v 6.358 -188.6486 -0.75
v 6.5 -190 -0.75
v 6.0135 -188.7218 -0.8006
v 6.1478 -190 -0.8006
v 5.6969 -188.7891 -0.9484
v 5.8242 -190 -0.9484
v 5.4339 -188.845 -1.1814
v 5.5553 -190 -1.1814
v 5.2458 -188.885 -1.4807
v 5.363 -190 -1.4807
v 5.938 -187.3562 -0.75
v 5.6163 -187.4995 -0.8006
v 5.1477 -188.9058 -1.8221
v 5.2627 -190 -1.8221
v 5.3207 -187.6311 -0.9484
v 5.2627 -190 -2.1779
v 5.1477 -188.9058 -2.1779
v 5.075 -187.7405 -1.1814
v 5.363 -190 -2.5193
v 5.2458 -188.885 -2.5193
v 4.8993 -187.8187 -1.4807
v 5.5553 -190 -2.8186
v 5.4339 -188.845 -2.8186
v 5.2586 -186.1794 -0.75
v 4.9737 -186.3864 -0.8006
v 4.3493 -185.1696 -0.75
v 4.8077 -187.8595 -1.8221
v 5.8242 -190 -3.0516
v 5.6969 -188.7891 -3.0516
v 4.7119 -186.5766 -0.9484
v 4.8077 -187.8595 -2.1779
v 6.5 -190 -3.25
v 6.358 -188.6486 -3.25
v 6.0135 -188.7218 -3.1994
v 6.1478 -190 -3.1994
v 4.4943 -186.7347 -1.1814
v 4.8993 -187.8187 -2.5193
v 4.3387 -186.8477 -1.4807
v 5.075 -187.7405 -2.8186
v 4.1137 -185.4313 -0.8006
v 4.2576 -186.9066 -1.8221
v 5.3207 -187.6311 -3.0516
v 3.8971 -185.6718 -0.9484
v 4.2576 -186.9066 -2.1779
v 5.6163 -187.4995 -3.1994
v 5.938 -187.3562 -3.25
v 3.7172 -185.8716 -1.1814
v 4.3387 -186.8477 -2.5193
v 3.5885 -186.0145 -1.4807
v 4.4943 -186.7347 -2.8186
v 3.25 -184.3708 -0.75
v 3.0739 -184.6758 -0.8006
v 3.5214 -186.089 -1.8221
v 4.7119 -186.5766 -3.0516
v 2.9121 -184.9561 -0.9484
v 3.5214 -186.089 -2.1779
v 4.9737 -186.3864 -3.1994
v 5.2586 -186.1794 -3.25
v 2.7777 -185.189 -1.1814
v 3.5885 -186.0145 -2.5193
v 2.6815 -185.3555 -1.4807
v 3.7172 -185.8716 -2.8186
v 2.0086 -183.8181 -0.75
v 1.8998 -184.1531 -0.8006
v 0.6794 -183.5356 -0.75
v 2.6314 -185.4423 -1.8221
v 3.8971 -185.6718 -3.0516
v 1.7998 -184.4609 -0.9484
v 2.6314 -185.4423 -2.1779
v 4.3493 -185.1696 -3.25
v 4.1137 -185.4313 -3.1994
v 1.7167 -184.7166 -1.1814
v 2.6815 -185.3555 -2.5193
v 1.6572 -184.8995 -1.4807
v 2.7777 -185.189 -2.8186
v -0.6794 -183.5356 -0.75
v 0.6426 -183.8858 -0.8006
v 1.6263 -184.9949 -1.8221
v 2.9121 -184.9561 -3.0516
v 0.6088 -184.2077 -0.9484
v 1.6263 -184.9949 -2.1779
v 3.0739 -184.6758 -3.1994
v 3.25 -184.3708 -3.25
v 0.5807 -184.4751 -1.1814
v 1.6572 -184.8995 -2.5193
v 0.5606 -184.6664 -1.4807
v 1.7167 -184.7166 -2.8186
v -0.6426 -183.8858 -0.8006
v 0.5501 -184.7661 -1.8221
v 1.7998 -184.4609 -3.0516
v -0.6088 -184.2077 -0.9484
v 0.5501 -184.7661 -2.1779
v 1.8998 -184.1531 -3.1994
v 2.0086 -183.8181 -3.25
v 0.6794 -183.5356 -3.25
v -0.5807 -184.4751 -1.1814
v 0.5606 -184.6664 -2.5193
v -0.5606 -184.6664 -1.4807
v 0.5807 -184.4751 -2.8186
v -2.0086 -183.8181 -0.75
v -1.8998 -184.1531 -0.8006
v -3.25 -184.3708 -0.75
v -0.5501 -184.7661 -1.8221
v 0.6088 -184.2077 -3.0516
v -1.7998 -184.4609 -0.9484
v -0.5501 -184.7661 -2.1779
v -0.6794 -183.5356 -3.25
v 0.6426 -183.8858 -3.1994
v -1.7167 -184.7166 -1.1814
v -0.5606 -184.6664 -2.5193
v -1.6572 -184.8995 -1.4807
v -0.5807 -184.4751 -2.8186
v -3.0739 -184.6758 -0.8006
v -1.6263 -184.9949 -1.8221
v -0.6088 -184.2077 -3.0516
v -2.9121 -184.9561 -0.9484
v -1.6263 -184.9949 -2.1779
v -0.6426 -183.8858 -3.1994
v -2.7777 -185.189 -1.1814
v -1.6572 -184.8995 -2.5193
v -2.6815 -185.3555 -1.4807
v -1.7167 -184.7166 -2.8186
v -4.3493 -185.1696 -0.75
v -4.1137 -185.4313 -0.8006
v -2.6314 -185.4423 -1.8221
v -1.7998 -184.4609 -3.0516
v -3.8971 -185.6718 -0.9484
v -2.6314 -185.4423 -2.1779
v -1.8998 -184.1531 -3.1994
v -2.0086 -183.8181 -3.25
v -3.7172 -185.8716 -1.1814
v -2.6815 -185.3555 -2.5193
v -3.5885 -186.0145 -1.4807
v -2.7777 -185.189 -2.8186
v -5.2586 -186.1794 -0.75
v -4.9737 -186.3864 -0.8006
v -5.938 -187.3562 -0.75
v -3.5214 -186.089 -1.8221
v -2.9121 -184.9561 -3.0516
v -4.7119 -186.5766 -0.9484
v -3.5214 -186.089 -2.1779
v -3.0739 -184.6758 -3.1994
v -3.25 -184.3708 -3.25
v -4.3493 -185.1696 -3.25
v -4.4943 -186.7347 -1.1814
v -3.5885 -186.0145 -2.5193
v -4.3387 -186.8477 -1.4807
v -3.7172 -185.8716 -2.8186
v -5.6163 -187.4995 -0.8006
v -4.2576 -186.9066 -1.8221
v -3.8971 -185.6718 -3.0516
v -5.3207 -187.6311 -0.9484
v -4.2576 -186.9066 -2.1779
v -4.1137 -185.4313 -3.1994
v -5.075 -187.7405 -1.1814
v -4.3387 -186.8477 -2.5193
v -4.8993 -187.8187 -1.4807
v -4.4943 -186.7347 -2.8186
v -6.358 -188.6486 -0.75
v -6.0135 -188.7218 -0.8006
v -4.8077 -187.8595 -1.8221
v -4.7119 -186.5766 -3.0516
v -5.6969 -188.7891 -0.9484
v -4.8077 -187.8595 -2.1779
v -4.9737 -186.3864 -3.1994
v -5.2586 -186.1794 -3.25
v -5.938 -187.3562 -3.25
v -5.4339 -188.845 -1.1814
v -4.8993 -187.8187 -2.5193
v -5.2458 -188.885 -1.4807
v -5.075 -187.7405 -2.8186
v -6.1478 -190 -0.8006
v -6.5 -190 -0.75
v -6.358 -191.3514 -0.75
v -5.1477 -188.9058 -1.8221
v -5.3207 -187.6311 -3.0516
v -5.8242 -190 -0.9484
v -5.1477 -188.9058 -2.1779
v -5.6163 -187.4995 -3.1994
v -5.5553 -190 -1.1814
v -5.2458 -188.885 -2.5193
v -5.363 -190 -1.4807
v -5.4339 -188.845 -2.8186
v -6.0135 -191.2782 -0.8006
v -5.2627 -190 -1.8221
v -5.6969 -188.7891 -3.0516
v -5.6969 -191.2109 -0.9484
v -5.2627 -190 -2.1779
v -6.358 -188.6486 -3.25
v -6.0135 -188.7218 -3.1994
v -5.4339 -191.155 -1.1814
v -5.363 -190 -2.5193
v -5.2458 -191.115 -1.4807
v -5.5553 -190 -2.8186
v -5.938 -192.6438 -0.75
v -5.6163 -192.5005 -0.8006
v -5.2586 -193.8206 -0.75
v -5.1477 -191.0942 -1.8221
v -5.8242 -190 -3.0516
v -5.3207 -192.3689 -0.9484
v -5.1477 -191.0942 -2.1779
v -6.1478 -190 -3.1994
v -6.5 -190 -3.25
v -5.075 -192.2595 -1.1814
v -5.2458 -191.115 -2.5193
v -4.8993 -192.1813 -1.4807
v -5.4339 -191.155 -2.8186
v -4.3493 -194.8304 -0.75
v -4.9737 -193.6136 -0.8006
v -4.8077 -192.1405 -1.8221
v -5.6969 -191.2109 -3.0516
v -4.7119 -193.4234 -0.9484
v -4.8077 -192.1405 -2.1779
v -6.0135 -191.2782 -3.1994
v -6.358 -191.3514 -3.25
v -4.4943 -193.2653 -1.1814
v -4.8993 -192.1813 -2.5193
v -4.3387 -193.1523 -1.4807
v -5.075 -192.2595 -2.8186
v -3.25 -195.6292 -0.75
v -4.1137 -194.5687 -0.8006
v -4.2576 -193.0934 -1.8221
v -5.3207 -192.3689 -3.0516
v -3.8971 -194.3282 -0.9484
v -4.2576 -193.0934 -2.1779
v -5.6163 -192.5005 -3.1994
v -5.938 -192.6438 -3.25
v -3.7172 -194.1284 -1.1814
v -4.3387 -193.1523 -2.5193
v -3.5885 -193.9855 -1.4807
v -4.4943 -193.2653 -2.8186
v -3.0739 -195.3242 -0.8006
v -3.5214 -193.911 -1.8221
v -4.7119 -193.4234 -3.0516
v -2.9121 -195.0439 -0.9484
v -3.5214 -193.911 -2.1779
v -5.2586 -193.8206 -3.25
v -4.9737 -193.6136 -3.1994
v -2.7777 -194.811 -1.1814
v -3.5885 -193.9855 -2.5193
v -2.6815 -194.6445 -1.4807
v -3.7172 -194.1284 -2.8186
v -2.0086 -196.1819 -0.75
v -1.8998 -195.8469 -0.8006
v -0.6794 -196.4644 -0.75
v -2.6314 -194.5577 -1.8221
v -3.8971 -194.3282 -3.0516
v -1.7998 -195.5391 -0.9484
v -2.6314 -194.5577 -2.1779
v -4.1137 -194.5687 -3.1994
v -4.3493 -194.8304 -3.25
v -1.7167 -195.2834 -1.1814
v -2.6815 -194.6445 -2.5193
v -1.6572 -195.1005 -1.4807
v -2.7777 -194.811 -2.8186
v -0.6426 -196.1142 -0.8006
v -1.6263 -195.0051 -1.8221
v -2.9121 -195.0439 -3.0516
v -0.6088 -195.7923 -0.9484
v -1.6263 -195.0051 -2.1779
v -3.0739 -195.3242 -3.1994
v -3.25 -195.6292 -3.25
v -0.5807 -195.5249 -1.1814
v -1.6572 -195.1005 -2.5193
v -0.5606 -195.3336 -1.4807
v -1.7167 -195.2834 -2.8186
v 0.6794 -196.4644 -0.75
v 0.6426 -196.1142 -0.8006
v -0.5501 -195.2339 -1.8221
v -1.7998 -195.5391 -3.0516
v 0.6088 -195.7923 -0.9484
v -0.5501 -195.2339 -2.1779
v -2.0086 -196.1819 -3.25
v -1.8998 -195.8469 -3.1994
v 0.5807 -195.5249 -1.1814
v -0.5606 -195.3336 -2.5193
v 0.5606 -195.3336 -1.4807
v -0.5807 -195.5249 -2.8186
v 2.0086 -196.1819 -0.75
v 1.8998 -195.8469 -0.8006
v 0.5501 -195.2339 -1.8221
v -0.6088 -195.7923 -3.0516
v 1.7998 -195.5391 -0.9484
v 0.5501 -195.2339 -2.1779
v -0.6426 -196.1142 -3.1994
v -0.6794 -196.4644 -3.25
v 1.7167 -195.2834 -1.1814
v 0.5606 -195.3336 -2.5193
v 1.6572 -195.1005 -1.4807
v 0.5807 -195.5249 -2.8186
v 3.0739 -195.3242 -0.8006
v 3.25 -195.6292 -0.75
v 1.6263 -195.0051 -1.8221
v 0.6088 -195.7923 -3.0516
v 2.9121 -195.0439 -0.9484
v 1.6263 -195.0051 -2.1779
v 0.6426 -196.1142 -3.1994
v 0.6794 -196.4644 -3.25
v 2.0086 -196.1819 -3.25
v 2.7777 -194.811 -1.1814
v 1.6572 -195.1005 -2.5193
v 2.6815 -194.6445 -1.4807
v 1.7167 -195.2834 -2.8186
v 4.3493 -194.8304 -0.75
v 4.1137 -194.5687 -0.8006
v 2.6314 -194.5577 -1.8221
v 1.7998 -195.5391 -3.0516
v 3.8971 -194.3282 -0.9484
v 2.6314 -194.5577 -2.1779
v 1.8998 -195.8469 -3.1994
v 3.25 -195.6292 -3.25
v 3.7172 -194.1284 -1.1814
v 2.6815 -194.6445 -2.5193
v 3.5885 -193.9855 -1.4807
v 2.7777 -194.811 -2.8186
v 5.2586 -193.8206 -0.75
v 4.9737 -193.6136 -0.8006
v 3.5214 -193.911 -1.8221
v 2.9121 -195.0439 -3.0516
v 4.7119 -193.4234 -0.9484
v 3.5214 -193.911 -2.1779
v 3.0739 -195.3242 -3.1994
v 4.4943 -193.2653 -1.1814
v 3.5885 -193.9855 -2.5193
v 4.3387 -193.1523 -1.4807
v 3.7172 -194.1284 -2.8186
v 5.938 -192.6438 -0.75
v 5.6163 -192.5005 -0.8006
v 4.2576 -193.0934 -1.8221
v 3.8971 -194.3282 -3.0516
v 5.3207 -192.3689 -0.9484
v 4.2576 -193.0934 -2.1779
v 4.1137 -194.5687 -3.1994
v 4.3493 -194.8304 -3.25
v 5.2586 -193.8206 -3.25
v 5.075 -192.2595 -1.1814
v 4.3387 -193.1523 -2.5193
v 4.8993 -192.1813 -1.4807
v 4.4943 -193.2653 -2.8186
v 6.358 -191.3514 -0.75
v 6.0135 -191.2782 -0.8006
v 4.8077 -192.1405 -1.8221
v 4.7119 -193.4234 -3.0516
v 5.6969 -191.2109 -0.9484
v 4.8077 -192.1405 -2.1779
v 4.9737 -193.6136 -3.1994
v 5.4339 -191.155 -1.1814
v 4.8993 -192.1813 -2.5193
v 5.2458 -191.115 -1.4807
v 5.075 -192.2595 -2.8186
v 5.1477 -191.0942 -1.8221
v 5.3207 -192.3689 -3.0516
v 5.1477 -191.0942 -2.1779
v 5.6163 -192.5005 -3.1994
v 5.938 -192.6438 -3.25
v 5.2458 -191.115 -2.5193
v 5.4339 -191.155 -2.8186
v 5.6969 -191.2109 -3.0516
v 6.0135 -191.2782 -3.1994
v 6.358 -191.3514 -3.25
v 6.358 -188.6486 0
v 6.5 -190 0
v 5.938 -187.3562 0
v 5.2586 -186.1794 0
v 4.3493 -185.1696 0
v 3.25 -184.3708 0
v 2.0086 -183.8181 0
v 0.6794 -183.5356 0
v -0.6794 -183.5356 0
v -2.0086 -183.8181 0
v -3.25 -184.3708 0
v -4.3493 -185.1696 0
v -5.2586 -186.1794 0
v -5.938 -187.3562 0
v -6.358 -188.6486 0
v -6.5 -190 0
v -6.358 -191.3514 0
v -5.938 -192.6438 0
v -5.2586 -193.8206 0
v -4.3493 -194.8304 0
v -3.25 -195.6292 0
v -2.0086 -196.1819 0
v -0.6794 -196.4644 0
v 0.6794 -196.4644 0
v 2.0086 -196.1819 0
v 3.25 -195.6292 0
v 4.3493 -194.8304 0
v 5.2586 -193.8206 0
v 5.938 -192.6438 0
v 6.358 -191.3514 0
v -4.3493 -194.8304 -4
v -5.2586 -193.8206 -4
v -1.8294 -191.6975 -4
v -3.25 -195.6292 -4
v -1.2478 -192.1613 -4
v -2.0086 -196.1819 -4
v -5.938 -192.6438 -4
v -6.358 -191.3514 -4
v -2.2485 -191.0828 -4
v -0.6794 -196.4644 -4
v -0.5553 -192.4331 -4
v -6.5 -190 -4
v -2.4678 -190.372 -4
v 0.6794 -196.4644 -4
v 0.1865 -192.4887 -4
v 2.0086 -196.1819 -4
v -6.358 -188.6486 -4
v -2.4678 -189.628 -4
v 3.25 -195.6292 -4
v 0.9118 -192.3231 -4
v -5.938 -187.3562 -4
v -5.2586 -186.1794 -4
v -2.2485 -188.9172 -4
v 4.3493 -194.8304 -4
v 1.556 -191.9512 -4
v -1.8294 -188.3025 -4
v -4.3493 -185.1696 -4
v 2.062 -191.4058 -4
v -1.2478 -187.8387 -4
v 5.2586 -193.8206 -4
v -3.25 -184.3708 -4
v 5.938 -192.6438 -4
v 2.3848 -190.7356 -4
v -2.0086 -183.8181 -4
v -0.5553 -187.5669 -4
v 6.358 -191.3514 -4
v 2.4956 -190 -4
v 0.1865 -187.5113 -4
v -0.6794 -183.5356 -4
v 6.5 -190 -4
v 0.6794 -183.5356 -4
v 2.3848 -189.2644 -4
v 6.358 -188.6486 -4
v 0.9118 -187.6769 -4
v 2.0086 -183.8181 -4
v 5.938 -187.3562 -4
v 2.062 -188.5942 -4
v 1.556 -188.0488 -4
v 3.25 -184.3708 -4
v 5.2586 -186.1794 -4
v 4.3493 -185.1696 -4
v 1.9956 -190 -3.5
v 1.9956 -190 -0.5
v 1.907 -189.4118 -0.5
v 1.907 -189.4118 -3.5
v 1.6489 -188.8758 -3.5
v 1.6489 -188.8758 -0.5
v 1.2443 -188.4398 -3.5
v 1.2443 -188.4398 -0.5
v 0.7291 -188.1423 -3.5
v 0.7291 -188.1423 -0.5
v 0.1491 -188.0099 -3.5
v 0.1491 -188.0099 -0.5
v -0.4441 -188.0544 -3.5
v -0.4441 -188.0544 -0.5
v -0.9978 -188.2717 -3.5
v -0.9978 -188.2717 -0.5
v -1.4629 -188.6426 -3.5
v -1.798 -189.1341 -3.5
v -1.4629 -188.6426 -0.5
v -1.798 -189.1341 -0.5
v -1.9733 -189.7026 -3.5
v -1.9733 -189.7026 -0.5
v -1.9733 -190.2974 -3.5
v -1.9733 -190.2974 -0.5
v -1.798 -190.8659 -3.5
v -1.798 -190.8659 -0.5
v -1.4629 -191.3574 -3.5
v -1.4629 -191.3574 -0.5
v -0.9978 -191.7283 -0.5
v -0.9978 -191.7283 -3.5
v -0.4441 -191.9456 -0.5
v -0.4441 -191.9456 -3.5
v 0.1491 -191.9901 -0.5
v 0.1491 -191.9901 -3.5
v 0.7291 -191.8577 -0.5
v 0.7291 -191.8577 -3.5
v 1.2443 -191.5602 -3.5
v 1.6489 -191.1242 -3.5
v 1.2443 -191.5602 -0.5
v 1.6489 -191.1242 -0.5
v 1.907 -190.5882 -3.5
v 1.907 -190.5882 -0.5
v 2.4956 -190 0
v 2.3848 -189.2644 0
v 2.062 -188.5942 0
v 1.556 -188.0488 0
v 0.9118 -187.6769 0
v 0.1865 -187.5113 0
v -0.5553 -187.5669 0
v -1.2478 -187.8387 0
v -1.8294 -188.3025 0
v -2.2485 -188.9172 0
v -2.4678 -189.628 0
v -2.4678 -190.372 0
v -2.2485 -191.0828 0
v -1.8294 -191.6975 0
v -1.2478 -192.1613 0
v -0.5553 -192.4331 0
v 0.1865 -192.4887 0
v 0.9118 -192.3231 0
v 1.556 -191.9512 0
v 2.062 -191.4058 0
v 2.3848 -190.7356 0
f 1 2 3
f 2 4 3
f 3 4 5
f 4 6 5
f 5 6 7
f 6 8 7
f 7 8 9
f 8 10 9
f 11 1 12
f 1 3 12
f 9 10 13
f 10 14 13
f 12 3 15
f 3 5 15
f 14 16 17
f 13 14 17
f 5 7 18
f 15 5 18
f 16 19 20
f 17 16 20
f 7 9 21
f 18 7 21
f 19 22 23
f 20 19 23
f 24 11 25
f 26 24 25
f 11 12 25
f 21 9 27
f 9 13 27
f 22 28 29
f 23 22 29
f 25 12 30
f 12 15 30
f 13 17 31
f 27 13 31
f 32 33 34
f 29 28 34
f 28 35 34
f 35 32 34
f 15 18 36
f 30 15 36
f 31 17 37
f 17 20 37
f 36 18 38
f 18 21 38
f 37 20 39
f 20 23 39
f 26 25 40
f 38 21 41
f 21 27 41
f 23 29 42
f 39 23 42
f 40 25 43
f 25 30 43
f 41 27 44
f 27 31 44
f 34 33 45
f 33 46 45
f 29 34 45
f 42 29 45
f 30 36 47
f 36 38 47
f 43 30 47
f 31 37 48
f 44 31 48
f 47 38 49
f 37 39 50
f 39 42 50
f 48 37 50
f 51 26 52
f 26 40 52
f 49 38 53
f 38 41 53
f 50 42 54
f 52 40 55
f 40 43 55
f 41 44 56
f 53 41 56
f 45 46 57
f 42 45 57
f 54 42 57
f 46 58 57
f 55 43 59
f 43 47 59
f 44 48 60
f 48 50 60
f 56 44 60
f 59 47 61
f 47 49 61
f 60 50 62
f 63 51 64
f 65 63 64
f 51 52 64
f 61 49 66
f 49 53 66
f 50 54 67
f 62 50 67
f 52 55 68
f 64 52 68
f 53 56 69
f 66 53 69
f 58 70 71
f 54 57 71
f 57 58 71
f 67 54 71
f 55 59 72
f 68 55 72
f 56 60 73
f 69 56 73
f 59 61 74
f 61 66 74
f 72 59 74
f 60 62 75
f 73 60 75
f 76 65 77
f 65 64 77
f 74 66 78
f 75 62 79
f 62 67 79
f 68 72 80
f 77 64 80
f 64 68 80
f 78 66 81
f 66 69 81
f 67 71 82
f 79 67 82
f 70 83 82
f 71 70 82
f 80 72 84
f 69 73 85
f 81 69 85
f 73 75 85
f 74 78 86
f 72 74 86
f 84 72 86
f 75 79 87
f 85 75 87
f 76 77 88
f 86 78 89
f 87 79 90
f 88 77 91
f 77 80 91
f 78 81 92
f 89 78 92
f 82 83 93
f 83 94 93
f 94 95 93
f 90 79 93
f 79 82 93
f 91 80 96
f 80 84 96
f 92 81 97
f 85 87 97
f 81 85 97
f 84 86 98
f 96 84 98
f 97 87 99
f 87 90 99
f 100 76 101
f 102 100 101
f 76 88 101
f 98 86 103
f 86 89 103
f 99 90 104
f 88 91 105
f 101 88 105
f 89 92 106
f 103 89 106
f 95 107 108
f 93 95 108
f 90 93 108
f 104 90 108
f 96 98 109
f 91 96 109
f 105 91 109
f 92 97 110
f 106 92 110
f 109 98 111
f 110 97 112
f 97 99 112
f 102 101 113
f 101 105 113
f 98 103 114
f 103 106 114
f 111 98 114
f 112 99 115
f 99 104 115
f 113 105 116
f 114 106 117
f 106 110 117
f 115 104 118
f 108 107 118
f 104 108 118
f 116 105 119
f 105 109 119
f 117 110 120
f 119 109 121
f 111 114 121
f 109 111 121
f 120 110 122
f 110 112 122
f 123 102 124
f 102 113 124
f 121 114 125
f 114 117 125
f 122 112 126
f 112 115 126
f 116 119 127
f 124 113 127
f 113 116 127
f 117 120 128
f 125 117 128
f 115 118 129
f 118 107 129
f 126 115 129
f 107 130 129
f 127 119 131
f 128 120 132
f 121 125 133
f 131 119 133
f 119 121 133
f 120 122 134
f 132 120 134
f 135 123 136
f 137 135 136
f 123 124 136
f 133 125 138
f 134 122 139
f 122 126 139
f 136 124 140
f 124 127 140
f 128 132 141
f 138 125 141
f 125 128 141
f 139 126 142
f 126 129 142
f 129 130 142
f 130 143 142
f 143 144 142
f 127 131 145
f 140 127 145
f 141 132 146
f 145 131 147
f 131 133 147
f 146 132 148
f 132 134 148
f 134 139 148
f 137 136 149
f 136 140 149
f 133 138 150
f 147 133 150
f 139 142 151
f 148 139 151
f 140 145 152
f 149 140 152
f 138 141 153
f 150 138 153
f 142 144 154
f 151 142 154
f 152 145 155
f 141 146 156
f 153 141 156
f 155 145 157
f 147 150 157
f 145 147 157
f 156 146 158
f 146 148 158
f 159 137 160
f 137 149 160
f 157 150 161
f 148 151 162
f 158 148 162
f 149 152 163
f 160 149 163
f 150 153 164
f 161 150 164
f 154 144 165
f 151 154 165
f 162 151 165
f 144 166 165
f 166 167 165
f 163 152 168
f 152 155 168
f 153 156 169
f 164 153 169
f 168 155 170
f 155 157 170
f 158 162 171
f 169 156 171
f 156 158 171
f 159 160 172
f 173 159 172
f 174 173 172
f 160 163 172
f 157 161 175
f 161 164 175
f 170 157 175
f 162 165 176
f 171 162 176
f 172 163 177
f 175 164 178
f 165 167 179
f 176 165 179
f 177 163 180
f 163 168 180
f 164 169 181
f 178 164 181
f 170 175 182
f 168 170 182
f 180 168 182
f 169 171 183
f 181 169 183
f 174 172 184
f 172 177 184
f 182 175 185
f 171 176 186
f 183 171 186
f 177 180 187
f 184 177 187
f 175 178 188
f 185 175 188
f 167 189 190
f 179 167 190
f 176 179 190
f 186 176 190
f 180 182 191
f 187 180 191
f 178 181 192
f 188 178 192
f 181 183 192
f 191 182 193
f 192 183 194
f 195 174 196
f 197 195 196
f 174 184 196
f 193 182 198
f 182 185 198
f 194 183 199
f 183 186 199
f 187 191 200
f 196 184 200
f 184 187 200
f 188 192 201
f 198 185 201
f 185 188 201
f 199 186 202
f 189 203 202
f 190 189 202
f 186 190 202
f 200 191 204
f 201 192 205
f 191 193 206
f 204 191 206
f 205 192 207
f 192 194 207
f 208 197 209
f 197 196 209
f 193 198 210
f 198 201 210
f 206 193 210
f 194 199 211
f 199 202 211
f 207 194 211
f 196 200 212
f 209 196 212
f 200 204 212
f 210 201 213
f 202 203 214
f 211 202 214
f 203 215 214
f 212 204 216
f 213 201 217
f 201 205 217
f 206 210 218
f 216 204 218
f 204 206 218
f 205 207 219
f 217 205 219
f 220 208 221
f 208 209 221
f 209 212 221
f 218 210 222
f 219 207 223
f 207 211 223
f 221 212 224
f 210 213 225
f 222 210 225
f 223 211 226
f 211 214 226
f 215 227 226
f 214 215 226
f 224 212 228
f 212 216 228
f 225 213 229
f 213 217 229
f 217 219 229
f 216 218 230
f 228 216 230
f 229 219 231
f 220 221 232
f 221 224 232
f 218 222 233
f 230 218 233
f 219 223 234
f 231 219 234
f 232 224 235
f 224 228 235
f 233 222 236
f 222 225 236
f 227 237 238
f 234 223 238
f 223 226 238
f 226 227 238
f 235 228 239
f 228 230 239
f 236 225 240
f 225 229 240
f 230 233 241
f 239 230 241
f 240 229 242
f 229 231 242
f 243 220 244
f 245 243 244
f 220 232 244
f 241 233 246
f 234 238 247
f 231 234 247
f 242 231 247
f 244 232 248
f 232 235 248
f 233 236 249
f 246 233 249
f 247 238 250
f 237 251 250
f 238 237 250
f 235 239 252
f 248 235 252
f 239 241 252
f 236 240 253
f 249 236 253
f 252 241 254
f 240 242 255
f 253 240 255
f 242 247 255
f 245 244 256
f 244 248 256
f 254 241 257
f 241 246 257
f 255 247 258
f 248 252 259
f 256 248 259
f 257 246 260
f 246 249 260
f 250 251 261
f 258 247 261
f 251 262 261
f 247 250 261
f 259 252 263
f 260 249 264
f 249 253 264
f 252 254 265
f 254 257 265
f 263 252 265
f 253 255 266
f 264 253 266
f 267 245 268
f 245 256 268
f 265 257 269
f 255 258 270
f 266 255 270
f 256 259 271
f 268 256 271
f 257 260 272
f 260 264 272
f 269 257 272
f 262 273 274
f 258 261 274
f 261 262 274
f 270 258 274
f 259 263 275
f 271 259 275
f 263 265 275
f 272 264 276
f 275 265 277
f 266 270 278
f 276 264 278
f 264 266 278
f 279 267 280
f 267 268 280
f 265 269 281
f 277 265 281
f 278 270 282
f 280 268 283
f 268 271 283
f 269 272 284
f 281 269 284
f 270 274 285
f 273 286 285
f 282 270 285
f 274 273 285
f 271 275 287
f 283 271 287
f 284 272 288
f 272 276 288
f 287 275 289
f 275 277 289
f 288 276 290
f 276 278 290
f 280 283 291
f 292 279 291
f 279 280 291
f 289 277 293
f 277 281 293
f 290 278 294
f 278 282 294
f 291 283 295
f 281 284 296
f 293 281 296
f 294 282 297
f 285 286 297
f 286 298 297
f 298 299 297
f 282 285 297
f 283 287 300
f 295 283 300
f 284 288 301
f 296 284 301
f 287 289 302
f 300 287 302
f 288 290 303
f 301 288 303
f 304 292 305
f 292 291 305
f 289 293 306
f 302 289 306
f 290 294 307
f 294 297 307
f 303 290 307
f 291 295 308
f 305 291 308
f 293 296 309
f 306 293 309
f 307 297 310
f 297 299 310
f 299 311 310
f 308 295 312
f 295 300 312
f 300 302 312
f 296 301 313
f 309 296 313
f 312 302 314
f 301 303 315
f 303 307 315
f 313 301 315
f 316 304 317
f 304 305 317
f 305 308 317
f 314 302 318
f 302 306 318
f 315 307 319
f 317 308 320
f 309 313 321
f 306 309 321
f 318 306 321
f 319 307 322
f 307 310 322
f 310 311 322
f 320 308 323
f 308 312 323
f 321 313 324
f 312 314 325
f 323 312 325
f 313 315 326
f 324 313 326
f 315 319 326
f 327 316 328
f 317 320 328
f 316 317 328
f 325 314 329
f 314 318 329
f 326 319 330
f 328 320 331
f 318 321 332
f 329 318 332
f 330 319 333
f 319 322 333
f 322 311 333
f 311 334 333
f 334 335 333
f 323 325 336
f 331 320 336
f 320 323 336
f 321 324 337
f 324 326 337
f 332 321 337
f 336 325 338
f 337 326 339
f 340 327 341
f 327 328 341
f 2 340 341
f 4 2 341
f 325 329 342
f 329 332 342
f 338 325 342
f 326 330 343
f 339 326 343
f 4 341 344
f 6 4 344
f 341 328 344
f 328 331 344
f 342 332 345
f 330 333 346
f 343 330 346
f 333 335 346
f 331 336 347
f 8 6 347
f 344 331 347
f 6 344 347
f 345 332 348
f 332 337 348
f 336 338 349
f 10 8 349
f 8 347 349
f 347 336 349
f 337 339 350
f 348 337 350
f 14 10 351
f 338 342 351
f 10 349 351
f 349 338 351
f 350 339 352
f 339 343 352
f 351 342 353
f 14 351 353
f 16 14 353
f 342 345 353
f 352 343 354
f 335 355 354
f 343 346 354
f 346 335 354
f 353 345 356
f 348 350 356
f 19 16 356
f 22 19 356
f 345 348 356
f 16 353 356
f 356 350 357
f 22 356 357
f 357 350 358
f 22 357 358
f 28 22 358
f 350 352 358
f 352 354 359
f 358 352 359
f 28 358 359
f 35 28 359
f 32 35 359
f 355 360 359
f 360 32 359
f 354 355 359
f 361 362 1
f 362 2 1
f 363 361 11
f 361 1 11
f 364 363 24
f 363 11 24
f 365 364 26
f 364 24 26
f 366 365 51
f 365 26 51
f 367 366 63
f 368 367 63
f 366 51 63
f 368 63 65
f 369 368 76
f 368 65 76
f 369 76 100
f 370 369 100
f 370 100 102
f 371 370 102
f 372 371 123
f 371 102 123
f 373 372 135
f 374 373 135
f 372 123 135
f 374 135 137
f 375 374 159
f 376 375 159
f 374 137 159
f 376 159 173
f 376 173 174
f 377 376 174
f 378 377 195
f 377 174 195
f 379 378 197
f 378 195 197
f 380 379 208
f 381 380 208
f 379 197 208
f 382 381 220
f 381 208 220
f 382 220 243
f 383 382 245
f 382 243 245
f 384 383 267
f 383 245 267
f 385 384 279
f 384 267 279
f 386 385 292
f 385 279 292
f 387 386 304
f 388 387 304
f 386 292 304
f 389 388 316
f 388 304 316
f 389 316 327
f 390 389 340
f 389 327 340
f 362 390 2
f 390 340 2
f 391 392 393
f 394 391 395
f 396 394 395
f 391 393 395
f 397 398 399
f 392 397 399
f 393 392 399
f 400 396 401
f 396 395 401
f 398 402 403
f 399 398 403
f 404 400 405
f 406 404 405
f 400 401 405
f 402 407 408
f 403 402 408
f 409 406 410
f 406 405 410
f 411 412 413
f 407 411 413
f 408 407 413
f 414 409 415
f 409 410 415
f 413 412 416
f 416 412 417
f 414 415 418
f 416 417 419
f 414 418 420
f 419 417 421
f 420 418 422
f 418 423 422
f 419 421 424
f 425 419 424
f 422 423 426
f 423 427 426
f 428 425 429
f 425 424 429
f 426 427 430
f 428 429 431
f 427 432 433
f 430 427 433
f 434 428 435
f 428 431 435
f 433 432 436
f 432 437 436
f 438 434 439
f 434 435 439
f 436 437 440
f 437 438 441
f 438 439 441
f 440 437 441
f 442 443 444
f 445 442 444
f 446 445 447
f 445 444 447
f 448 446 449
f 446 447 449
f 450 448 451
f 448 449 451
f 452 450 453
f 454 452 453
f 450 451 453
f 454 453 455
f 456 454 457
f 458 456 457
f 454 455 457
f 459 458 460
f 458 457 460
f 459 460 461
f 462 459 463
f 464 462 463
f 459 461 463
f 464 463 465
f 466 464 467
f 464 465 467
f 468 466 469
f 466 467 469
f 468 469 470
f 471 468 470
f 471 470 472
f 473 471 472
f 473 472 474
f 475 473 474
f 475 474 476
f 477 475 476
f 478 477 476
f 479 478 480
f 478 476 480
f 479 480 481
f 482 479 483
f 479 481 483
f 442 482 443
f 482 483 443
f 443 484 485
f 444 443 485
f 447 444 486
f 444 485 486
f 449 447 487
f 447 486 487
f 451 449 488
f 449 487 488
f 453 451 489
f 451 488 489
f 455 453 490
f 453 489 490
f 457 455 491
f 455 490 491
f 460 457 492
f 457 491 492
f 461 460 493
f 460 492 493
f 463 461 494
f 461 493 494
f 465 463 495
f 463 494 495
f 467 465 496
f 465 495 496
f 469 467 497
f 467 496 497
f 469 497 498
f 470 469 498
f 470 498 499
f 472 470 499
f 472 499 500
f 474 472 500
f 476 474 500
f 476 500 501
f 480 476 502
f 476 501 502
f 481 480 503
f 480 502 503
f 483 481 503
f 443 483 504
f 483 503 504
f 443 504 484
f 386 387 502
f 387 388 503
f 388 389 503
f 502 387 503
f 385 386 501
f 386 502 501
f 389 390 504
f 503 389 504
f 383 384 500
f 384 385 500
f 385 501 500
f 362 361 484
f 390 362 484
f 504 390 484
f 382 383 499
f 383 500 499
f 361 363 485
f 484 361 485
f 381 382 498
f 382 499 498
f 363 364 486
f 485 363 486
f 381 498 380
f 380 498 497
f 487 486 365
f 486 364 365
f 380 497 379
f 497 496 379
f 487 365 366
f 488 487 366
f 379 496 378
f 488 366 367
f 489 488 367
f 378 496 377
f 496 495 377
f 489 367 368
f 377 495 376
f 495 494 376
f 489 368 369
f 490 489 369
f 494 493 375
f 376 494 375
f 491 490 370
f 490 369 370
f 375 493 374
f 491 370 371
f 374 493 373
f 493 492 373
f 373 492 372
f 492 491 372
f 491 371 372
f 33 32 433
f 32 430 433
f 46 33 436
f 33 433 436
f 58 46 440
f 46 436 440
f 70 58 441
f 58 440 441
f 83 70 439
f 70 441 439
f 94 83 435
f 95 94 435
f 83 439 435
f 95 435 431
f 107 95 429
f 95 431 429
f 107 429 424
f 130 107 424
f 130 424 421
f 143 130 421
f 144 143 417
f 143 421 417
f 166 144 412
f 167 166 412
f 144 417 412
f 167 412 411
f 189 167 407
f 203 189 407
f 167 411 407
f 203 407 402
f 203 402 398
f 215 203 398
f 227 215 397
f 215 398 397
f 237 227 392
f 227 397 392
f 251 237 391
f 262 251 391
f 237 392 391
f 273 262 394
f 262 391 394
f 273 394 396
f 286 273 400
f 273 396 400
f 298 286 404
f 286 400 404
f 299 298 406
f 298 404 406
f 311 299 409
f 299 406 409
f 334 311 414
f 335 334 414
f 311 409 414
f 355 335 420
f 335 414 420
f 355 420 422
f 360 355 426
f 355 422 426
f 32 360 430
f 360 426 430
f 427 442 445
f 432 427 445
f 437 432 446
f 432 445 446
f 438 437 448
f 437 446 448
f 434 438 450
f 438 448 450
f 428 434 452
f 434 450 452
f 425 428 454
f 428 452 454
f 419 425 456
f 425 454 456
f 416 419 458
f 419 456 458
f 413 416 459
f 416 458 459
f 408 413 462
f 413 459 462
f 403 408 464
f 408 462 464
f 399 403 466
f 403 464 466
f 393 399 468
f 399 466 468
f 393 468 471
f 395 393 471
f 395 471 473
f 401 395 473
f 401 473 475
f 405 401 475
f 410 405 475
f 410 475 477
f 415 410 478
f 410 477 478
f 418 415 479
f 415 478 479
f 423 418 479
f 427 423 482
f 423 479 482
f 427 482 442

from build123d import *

# Parameters (mm, degrees)
CHAFL_N2_SIZE = 0.5


with BuildPart() as part:
    # Croquis1 → Revolución1 (revolve)
    with BuildSketch(Plane(origin=(0, -190, 0), x_dir=(1, 0, 0), z_dir=(0, 1, 0))):
        with BuildLine():
            Line((6.5, 0), (6.5, 0.75))
            ThreePointArc((6.5, 0.75), (5.25, 2), (6.5, 3.25))
            Line((6.5, 3.25), (6.5, 4))
            Line((6.5, 4), (1.995632004, 4))
            Line((1.995632004, 4), (1.995632004, 0))
            Line((1.995632004, 0), (6.5, 0))
        make_face()
    revolve(axis=Axis((0, -190, -5), (0, 0, 1)))

    # Chaflán2
    chafl_n2_edges = [part.edges().sort_by_distance(p)[0] for p in [
        (-1.995632004, -190, 0),
        (-1.995632004, -190, -4),
    ]]
    chamfer(chafl_n2_edges, length=CHAFL_N2_SIZE)


solid = part.part
